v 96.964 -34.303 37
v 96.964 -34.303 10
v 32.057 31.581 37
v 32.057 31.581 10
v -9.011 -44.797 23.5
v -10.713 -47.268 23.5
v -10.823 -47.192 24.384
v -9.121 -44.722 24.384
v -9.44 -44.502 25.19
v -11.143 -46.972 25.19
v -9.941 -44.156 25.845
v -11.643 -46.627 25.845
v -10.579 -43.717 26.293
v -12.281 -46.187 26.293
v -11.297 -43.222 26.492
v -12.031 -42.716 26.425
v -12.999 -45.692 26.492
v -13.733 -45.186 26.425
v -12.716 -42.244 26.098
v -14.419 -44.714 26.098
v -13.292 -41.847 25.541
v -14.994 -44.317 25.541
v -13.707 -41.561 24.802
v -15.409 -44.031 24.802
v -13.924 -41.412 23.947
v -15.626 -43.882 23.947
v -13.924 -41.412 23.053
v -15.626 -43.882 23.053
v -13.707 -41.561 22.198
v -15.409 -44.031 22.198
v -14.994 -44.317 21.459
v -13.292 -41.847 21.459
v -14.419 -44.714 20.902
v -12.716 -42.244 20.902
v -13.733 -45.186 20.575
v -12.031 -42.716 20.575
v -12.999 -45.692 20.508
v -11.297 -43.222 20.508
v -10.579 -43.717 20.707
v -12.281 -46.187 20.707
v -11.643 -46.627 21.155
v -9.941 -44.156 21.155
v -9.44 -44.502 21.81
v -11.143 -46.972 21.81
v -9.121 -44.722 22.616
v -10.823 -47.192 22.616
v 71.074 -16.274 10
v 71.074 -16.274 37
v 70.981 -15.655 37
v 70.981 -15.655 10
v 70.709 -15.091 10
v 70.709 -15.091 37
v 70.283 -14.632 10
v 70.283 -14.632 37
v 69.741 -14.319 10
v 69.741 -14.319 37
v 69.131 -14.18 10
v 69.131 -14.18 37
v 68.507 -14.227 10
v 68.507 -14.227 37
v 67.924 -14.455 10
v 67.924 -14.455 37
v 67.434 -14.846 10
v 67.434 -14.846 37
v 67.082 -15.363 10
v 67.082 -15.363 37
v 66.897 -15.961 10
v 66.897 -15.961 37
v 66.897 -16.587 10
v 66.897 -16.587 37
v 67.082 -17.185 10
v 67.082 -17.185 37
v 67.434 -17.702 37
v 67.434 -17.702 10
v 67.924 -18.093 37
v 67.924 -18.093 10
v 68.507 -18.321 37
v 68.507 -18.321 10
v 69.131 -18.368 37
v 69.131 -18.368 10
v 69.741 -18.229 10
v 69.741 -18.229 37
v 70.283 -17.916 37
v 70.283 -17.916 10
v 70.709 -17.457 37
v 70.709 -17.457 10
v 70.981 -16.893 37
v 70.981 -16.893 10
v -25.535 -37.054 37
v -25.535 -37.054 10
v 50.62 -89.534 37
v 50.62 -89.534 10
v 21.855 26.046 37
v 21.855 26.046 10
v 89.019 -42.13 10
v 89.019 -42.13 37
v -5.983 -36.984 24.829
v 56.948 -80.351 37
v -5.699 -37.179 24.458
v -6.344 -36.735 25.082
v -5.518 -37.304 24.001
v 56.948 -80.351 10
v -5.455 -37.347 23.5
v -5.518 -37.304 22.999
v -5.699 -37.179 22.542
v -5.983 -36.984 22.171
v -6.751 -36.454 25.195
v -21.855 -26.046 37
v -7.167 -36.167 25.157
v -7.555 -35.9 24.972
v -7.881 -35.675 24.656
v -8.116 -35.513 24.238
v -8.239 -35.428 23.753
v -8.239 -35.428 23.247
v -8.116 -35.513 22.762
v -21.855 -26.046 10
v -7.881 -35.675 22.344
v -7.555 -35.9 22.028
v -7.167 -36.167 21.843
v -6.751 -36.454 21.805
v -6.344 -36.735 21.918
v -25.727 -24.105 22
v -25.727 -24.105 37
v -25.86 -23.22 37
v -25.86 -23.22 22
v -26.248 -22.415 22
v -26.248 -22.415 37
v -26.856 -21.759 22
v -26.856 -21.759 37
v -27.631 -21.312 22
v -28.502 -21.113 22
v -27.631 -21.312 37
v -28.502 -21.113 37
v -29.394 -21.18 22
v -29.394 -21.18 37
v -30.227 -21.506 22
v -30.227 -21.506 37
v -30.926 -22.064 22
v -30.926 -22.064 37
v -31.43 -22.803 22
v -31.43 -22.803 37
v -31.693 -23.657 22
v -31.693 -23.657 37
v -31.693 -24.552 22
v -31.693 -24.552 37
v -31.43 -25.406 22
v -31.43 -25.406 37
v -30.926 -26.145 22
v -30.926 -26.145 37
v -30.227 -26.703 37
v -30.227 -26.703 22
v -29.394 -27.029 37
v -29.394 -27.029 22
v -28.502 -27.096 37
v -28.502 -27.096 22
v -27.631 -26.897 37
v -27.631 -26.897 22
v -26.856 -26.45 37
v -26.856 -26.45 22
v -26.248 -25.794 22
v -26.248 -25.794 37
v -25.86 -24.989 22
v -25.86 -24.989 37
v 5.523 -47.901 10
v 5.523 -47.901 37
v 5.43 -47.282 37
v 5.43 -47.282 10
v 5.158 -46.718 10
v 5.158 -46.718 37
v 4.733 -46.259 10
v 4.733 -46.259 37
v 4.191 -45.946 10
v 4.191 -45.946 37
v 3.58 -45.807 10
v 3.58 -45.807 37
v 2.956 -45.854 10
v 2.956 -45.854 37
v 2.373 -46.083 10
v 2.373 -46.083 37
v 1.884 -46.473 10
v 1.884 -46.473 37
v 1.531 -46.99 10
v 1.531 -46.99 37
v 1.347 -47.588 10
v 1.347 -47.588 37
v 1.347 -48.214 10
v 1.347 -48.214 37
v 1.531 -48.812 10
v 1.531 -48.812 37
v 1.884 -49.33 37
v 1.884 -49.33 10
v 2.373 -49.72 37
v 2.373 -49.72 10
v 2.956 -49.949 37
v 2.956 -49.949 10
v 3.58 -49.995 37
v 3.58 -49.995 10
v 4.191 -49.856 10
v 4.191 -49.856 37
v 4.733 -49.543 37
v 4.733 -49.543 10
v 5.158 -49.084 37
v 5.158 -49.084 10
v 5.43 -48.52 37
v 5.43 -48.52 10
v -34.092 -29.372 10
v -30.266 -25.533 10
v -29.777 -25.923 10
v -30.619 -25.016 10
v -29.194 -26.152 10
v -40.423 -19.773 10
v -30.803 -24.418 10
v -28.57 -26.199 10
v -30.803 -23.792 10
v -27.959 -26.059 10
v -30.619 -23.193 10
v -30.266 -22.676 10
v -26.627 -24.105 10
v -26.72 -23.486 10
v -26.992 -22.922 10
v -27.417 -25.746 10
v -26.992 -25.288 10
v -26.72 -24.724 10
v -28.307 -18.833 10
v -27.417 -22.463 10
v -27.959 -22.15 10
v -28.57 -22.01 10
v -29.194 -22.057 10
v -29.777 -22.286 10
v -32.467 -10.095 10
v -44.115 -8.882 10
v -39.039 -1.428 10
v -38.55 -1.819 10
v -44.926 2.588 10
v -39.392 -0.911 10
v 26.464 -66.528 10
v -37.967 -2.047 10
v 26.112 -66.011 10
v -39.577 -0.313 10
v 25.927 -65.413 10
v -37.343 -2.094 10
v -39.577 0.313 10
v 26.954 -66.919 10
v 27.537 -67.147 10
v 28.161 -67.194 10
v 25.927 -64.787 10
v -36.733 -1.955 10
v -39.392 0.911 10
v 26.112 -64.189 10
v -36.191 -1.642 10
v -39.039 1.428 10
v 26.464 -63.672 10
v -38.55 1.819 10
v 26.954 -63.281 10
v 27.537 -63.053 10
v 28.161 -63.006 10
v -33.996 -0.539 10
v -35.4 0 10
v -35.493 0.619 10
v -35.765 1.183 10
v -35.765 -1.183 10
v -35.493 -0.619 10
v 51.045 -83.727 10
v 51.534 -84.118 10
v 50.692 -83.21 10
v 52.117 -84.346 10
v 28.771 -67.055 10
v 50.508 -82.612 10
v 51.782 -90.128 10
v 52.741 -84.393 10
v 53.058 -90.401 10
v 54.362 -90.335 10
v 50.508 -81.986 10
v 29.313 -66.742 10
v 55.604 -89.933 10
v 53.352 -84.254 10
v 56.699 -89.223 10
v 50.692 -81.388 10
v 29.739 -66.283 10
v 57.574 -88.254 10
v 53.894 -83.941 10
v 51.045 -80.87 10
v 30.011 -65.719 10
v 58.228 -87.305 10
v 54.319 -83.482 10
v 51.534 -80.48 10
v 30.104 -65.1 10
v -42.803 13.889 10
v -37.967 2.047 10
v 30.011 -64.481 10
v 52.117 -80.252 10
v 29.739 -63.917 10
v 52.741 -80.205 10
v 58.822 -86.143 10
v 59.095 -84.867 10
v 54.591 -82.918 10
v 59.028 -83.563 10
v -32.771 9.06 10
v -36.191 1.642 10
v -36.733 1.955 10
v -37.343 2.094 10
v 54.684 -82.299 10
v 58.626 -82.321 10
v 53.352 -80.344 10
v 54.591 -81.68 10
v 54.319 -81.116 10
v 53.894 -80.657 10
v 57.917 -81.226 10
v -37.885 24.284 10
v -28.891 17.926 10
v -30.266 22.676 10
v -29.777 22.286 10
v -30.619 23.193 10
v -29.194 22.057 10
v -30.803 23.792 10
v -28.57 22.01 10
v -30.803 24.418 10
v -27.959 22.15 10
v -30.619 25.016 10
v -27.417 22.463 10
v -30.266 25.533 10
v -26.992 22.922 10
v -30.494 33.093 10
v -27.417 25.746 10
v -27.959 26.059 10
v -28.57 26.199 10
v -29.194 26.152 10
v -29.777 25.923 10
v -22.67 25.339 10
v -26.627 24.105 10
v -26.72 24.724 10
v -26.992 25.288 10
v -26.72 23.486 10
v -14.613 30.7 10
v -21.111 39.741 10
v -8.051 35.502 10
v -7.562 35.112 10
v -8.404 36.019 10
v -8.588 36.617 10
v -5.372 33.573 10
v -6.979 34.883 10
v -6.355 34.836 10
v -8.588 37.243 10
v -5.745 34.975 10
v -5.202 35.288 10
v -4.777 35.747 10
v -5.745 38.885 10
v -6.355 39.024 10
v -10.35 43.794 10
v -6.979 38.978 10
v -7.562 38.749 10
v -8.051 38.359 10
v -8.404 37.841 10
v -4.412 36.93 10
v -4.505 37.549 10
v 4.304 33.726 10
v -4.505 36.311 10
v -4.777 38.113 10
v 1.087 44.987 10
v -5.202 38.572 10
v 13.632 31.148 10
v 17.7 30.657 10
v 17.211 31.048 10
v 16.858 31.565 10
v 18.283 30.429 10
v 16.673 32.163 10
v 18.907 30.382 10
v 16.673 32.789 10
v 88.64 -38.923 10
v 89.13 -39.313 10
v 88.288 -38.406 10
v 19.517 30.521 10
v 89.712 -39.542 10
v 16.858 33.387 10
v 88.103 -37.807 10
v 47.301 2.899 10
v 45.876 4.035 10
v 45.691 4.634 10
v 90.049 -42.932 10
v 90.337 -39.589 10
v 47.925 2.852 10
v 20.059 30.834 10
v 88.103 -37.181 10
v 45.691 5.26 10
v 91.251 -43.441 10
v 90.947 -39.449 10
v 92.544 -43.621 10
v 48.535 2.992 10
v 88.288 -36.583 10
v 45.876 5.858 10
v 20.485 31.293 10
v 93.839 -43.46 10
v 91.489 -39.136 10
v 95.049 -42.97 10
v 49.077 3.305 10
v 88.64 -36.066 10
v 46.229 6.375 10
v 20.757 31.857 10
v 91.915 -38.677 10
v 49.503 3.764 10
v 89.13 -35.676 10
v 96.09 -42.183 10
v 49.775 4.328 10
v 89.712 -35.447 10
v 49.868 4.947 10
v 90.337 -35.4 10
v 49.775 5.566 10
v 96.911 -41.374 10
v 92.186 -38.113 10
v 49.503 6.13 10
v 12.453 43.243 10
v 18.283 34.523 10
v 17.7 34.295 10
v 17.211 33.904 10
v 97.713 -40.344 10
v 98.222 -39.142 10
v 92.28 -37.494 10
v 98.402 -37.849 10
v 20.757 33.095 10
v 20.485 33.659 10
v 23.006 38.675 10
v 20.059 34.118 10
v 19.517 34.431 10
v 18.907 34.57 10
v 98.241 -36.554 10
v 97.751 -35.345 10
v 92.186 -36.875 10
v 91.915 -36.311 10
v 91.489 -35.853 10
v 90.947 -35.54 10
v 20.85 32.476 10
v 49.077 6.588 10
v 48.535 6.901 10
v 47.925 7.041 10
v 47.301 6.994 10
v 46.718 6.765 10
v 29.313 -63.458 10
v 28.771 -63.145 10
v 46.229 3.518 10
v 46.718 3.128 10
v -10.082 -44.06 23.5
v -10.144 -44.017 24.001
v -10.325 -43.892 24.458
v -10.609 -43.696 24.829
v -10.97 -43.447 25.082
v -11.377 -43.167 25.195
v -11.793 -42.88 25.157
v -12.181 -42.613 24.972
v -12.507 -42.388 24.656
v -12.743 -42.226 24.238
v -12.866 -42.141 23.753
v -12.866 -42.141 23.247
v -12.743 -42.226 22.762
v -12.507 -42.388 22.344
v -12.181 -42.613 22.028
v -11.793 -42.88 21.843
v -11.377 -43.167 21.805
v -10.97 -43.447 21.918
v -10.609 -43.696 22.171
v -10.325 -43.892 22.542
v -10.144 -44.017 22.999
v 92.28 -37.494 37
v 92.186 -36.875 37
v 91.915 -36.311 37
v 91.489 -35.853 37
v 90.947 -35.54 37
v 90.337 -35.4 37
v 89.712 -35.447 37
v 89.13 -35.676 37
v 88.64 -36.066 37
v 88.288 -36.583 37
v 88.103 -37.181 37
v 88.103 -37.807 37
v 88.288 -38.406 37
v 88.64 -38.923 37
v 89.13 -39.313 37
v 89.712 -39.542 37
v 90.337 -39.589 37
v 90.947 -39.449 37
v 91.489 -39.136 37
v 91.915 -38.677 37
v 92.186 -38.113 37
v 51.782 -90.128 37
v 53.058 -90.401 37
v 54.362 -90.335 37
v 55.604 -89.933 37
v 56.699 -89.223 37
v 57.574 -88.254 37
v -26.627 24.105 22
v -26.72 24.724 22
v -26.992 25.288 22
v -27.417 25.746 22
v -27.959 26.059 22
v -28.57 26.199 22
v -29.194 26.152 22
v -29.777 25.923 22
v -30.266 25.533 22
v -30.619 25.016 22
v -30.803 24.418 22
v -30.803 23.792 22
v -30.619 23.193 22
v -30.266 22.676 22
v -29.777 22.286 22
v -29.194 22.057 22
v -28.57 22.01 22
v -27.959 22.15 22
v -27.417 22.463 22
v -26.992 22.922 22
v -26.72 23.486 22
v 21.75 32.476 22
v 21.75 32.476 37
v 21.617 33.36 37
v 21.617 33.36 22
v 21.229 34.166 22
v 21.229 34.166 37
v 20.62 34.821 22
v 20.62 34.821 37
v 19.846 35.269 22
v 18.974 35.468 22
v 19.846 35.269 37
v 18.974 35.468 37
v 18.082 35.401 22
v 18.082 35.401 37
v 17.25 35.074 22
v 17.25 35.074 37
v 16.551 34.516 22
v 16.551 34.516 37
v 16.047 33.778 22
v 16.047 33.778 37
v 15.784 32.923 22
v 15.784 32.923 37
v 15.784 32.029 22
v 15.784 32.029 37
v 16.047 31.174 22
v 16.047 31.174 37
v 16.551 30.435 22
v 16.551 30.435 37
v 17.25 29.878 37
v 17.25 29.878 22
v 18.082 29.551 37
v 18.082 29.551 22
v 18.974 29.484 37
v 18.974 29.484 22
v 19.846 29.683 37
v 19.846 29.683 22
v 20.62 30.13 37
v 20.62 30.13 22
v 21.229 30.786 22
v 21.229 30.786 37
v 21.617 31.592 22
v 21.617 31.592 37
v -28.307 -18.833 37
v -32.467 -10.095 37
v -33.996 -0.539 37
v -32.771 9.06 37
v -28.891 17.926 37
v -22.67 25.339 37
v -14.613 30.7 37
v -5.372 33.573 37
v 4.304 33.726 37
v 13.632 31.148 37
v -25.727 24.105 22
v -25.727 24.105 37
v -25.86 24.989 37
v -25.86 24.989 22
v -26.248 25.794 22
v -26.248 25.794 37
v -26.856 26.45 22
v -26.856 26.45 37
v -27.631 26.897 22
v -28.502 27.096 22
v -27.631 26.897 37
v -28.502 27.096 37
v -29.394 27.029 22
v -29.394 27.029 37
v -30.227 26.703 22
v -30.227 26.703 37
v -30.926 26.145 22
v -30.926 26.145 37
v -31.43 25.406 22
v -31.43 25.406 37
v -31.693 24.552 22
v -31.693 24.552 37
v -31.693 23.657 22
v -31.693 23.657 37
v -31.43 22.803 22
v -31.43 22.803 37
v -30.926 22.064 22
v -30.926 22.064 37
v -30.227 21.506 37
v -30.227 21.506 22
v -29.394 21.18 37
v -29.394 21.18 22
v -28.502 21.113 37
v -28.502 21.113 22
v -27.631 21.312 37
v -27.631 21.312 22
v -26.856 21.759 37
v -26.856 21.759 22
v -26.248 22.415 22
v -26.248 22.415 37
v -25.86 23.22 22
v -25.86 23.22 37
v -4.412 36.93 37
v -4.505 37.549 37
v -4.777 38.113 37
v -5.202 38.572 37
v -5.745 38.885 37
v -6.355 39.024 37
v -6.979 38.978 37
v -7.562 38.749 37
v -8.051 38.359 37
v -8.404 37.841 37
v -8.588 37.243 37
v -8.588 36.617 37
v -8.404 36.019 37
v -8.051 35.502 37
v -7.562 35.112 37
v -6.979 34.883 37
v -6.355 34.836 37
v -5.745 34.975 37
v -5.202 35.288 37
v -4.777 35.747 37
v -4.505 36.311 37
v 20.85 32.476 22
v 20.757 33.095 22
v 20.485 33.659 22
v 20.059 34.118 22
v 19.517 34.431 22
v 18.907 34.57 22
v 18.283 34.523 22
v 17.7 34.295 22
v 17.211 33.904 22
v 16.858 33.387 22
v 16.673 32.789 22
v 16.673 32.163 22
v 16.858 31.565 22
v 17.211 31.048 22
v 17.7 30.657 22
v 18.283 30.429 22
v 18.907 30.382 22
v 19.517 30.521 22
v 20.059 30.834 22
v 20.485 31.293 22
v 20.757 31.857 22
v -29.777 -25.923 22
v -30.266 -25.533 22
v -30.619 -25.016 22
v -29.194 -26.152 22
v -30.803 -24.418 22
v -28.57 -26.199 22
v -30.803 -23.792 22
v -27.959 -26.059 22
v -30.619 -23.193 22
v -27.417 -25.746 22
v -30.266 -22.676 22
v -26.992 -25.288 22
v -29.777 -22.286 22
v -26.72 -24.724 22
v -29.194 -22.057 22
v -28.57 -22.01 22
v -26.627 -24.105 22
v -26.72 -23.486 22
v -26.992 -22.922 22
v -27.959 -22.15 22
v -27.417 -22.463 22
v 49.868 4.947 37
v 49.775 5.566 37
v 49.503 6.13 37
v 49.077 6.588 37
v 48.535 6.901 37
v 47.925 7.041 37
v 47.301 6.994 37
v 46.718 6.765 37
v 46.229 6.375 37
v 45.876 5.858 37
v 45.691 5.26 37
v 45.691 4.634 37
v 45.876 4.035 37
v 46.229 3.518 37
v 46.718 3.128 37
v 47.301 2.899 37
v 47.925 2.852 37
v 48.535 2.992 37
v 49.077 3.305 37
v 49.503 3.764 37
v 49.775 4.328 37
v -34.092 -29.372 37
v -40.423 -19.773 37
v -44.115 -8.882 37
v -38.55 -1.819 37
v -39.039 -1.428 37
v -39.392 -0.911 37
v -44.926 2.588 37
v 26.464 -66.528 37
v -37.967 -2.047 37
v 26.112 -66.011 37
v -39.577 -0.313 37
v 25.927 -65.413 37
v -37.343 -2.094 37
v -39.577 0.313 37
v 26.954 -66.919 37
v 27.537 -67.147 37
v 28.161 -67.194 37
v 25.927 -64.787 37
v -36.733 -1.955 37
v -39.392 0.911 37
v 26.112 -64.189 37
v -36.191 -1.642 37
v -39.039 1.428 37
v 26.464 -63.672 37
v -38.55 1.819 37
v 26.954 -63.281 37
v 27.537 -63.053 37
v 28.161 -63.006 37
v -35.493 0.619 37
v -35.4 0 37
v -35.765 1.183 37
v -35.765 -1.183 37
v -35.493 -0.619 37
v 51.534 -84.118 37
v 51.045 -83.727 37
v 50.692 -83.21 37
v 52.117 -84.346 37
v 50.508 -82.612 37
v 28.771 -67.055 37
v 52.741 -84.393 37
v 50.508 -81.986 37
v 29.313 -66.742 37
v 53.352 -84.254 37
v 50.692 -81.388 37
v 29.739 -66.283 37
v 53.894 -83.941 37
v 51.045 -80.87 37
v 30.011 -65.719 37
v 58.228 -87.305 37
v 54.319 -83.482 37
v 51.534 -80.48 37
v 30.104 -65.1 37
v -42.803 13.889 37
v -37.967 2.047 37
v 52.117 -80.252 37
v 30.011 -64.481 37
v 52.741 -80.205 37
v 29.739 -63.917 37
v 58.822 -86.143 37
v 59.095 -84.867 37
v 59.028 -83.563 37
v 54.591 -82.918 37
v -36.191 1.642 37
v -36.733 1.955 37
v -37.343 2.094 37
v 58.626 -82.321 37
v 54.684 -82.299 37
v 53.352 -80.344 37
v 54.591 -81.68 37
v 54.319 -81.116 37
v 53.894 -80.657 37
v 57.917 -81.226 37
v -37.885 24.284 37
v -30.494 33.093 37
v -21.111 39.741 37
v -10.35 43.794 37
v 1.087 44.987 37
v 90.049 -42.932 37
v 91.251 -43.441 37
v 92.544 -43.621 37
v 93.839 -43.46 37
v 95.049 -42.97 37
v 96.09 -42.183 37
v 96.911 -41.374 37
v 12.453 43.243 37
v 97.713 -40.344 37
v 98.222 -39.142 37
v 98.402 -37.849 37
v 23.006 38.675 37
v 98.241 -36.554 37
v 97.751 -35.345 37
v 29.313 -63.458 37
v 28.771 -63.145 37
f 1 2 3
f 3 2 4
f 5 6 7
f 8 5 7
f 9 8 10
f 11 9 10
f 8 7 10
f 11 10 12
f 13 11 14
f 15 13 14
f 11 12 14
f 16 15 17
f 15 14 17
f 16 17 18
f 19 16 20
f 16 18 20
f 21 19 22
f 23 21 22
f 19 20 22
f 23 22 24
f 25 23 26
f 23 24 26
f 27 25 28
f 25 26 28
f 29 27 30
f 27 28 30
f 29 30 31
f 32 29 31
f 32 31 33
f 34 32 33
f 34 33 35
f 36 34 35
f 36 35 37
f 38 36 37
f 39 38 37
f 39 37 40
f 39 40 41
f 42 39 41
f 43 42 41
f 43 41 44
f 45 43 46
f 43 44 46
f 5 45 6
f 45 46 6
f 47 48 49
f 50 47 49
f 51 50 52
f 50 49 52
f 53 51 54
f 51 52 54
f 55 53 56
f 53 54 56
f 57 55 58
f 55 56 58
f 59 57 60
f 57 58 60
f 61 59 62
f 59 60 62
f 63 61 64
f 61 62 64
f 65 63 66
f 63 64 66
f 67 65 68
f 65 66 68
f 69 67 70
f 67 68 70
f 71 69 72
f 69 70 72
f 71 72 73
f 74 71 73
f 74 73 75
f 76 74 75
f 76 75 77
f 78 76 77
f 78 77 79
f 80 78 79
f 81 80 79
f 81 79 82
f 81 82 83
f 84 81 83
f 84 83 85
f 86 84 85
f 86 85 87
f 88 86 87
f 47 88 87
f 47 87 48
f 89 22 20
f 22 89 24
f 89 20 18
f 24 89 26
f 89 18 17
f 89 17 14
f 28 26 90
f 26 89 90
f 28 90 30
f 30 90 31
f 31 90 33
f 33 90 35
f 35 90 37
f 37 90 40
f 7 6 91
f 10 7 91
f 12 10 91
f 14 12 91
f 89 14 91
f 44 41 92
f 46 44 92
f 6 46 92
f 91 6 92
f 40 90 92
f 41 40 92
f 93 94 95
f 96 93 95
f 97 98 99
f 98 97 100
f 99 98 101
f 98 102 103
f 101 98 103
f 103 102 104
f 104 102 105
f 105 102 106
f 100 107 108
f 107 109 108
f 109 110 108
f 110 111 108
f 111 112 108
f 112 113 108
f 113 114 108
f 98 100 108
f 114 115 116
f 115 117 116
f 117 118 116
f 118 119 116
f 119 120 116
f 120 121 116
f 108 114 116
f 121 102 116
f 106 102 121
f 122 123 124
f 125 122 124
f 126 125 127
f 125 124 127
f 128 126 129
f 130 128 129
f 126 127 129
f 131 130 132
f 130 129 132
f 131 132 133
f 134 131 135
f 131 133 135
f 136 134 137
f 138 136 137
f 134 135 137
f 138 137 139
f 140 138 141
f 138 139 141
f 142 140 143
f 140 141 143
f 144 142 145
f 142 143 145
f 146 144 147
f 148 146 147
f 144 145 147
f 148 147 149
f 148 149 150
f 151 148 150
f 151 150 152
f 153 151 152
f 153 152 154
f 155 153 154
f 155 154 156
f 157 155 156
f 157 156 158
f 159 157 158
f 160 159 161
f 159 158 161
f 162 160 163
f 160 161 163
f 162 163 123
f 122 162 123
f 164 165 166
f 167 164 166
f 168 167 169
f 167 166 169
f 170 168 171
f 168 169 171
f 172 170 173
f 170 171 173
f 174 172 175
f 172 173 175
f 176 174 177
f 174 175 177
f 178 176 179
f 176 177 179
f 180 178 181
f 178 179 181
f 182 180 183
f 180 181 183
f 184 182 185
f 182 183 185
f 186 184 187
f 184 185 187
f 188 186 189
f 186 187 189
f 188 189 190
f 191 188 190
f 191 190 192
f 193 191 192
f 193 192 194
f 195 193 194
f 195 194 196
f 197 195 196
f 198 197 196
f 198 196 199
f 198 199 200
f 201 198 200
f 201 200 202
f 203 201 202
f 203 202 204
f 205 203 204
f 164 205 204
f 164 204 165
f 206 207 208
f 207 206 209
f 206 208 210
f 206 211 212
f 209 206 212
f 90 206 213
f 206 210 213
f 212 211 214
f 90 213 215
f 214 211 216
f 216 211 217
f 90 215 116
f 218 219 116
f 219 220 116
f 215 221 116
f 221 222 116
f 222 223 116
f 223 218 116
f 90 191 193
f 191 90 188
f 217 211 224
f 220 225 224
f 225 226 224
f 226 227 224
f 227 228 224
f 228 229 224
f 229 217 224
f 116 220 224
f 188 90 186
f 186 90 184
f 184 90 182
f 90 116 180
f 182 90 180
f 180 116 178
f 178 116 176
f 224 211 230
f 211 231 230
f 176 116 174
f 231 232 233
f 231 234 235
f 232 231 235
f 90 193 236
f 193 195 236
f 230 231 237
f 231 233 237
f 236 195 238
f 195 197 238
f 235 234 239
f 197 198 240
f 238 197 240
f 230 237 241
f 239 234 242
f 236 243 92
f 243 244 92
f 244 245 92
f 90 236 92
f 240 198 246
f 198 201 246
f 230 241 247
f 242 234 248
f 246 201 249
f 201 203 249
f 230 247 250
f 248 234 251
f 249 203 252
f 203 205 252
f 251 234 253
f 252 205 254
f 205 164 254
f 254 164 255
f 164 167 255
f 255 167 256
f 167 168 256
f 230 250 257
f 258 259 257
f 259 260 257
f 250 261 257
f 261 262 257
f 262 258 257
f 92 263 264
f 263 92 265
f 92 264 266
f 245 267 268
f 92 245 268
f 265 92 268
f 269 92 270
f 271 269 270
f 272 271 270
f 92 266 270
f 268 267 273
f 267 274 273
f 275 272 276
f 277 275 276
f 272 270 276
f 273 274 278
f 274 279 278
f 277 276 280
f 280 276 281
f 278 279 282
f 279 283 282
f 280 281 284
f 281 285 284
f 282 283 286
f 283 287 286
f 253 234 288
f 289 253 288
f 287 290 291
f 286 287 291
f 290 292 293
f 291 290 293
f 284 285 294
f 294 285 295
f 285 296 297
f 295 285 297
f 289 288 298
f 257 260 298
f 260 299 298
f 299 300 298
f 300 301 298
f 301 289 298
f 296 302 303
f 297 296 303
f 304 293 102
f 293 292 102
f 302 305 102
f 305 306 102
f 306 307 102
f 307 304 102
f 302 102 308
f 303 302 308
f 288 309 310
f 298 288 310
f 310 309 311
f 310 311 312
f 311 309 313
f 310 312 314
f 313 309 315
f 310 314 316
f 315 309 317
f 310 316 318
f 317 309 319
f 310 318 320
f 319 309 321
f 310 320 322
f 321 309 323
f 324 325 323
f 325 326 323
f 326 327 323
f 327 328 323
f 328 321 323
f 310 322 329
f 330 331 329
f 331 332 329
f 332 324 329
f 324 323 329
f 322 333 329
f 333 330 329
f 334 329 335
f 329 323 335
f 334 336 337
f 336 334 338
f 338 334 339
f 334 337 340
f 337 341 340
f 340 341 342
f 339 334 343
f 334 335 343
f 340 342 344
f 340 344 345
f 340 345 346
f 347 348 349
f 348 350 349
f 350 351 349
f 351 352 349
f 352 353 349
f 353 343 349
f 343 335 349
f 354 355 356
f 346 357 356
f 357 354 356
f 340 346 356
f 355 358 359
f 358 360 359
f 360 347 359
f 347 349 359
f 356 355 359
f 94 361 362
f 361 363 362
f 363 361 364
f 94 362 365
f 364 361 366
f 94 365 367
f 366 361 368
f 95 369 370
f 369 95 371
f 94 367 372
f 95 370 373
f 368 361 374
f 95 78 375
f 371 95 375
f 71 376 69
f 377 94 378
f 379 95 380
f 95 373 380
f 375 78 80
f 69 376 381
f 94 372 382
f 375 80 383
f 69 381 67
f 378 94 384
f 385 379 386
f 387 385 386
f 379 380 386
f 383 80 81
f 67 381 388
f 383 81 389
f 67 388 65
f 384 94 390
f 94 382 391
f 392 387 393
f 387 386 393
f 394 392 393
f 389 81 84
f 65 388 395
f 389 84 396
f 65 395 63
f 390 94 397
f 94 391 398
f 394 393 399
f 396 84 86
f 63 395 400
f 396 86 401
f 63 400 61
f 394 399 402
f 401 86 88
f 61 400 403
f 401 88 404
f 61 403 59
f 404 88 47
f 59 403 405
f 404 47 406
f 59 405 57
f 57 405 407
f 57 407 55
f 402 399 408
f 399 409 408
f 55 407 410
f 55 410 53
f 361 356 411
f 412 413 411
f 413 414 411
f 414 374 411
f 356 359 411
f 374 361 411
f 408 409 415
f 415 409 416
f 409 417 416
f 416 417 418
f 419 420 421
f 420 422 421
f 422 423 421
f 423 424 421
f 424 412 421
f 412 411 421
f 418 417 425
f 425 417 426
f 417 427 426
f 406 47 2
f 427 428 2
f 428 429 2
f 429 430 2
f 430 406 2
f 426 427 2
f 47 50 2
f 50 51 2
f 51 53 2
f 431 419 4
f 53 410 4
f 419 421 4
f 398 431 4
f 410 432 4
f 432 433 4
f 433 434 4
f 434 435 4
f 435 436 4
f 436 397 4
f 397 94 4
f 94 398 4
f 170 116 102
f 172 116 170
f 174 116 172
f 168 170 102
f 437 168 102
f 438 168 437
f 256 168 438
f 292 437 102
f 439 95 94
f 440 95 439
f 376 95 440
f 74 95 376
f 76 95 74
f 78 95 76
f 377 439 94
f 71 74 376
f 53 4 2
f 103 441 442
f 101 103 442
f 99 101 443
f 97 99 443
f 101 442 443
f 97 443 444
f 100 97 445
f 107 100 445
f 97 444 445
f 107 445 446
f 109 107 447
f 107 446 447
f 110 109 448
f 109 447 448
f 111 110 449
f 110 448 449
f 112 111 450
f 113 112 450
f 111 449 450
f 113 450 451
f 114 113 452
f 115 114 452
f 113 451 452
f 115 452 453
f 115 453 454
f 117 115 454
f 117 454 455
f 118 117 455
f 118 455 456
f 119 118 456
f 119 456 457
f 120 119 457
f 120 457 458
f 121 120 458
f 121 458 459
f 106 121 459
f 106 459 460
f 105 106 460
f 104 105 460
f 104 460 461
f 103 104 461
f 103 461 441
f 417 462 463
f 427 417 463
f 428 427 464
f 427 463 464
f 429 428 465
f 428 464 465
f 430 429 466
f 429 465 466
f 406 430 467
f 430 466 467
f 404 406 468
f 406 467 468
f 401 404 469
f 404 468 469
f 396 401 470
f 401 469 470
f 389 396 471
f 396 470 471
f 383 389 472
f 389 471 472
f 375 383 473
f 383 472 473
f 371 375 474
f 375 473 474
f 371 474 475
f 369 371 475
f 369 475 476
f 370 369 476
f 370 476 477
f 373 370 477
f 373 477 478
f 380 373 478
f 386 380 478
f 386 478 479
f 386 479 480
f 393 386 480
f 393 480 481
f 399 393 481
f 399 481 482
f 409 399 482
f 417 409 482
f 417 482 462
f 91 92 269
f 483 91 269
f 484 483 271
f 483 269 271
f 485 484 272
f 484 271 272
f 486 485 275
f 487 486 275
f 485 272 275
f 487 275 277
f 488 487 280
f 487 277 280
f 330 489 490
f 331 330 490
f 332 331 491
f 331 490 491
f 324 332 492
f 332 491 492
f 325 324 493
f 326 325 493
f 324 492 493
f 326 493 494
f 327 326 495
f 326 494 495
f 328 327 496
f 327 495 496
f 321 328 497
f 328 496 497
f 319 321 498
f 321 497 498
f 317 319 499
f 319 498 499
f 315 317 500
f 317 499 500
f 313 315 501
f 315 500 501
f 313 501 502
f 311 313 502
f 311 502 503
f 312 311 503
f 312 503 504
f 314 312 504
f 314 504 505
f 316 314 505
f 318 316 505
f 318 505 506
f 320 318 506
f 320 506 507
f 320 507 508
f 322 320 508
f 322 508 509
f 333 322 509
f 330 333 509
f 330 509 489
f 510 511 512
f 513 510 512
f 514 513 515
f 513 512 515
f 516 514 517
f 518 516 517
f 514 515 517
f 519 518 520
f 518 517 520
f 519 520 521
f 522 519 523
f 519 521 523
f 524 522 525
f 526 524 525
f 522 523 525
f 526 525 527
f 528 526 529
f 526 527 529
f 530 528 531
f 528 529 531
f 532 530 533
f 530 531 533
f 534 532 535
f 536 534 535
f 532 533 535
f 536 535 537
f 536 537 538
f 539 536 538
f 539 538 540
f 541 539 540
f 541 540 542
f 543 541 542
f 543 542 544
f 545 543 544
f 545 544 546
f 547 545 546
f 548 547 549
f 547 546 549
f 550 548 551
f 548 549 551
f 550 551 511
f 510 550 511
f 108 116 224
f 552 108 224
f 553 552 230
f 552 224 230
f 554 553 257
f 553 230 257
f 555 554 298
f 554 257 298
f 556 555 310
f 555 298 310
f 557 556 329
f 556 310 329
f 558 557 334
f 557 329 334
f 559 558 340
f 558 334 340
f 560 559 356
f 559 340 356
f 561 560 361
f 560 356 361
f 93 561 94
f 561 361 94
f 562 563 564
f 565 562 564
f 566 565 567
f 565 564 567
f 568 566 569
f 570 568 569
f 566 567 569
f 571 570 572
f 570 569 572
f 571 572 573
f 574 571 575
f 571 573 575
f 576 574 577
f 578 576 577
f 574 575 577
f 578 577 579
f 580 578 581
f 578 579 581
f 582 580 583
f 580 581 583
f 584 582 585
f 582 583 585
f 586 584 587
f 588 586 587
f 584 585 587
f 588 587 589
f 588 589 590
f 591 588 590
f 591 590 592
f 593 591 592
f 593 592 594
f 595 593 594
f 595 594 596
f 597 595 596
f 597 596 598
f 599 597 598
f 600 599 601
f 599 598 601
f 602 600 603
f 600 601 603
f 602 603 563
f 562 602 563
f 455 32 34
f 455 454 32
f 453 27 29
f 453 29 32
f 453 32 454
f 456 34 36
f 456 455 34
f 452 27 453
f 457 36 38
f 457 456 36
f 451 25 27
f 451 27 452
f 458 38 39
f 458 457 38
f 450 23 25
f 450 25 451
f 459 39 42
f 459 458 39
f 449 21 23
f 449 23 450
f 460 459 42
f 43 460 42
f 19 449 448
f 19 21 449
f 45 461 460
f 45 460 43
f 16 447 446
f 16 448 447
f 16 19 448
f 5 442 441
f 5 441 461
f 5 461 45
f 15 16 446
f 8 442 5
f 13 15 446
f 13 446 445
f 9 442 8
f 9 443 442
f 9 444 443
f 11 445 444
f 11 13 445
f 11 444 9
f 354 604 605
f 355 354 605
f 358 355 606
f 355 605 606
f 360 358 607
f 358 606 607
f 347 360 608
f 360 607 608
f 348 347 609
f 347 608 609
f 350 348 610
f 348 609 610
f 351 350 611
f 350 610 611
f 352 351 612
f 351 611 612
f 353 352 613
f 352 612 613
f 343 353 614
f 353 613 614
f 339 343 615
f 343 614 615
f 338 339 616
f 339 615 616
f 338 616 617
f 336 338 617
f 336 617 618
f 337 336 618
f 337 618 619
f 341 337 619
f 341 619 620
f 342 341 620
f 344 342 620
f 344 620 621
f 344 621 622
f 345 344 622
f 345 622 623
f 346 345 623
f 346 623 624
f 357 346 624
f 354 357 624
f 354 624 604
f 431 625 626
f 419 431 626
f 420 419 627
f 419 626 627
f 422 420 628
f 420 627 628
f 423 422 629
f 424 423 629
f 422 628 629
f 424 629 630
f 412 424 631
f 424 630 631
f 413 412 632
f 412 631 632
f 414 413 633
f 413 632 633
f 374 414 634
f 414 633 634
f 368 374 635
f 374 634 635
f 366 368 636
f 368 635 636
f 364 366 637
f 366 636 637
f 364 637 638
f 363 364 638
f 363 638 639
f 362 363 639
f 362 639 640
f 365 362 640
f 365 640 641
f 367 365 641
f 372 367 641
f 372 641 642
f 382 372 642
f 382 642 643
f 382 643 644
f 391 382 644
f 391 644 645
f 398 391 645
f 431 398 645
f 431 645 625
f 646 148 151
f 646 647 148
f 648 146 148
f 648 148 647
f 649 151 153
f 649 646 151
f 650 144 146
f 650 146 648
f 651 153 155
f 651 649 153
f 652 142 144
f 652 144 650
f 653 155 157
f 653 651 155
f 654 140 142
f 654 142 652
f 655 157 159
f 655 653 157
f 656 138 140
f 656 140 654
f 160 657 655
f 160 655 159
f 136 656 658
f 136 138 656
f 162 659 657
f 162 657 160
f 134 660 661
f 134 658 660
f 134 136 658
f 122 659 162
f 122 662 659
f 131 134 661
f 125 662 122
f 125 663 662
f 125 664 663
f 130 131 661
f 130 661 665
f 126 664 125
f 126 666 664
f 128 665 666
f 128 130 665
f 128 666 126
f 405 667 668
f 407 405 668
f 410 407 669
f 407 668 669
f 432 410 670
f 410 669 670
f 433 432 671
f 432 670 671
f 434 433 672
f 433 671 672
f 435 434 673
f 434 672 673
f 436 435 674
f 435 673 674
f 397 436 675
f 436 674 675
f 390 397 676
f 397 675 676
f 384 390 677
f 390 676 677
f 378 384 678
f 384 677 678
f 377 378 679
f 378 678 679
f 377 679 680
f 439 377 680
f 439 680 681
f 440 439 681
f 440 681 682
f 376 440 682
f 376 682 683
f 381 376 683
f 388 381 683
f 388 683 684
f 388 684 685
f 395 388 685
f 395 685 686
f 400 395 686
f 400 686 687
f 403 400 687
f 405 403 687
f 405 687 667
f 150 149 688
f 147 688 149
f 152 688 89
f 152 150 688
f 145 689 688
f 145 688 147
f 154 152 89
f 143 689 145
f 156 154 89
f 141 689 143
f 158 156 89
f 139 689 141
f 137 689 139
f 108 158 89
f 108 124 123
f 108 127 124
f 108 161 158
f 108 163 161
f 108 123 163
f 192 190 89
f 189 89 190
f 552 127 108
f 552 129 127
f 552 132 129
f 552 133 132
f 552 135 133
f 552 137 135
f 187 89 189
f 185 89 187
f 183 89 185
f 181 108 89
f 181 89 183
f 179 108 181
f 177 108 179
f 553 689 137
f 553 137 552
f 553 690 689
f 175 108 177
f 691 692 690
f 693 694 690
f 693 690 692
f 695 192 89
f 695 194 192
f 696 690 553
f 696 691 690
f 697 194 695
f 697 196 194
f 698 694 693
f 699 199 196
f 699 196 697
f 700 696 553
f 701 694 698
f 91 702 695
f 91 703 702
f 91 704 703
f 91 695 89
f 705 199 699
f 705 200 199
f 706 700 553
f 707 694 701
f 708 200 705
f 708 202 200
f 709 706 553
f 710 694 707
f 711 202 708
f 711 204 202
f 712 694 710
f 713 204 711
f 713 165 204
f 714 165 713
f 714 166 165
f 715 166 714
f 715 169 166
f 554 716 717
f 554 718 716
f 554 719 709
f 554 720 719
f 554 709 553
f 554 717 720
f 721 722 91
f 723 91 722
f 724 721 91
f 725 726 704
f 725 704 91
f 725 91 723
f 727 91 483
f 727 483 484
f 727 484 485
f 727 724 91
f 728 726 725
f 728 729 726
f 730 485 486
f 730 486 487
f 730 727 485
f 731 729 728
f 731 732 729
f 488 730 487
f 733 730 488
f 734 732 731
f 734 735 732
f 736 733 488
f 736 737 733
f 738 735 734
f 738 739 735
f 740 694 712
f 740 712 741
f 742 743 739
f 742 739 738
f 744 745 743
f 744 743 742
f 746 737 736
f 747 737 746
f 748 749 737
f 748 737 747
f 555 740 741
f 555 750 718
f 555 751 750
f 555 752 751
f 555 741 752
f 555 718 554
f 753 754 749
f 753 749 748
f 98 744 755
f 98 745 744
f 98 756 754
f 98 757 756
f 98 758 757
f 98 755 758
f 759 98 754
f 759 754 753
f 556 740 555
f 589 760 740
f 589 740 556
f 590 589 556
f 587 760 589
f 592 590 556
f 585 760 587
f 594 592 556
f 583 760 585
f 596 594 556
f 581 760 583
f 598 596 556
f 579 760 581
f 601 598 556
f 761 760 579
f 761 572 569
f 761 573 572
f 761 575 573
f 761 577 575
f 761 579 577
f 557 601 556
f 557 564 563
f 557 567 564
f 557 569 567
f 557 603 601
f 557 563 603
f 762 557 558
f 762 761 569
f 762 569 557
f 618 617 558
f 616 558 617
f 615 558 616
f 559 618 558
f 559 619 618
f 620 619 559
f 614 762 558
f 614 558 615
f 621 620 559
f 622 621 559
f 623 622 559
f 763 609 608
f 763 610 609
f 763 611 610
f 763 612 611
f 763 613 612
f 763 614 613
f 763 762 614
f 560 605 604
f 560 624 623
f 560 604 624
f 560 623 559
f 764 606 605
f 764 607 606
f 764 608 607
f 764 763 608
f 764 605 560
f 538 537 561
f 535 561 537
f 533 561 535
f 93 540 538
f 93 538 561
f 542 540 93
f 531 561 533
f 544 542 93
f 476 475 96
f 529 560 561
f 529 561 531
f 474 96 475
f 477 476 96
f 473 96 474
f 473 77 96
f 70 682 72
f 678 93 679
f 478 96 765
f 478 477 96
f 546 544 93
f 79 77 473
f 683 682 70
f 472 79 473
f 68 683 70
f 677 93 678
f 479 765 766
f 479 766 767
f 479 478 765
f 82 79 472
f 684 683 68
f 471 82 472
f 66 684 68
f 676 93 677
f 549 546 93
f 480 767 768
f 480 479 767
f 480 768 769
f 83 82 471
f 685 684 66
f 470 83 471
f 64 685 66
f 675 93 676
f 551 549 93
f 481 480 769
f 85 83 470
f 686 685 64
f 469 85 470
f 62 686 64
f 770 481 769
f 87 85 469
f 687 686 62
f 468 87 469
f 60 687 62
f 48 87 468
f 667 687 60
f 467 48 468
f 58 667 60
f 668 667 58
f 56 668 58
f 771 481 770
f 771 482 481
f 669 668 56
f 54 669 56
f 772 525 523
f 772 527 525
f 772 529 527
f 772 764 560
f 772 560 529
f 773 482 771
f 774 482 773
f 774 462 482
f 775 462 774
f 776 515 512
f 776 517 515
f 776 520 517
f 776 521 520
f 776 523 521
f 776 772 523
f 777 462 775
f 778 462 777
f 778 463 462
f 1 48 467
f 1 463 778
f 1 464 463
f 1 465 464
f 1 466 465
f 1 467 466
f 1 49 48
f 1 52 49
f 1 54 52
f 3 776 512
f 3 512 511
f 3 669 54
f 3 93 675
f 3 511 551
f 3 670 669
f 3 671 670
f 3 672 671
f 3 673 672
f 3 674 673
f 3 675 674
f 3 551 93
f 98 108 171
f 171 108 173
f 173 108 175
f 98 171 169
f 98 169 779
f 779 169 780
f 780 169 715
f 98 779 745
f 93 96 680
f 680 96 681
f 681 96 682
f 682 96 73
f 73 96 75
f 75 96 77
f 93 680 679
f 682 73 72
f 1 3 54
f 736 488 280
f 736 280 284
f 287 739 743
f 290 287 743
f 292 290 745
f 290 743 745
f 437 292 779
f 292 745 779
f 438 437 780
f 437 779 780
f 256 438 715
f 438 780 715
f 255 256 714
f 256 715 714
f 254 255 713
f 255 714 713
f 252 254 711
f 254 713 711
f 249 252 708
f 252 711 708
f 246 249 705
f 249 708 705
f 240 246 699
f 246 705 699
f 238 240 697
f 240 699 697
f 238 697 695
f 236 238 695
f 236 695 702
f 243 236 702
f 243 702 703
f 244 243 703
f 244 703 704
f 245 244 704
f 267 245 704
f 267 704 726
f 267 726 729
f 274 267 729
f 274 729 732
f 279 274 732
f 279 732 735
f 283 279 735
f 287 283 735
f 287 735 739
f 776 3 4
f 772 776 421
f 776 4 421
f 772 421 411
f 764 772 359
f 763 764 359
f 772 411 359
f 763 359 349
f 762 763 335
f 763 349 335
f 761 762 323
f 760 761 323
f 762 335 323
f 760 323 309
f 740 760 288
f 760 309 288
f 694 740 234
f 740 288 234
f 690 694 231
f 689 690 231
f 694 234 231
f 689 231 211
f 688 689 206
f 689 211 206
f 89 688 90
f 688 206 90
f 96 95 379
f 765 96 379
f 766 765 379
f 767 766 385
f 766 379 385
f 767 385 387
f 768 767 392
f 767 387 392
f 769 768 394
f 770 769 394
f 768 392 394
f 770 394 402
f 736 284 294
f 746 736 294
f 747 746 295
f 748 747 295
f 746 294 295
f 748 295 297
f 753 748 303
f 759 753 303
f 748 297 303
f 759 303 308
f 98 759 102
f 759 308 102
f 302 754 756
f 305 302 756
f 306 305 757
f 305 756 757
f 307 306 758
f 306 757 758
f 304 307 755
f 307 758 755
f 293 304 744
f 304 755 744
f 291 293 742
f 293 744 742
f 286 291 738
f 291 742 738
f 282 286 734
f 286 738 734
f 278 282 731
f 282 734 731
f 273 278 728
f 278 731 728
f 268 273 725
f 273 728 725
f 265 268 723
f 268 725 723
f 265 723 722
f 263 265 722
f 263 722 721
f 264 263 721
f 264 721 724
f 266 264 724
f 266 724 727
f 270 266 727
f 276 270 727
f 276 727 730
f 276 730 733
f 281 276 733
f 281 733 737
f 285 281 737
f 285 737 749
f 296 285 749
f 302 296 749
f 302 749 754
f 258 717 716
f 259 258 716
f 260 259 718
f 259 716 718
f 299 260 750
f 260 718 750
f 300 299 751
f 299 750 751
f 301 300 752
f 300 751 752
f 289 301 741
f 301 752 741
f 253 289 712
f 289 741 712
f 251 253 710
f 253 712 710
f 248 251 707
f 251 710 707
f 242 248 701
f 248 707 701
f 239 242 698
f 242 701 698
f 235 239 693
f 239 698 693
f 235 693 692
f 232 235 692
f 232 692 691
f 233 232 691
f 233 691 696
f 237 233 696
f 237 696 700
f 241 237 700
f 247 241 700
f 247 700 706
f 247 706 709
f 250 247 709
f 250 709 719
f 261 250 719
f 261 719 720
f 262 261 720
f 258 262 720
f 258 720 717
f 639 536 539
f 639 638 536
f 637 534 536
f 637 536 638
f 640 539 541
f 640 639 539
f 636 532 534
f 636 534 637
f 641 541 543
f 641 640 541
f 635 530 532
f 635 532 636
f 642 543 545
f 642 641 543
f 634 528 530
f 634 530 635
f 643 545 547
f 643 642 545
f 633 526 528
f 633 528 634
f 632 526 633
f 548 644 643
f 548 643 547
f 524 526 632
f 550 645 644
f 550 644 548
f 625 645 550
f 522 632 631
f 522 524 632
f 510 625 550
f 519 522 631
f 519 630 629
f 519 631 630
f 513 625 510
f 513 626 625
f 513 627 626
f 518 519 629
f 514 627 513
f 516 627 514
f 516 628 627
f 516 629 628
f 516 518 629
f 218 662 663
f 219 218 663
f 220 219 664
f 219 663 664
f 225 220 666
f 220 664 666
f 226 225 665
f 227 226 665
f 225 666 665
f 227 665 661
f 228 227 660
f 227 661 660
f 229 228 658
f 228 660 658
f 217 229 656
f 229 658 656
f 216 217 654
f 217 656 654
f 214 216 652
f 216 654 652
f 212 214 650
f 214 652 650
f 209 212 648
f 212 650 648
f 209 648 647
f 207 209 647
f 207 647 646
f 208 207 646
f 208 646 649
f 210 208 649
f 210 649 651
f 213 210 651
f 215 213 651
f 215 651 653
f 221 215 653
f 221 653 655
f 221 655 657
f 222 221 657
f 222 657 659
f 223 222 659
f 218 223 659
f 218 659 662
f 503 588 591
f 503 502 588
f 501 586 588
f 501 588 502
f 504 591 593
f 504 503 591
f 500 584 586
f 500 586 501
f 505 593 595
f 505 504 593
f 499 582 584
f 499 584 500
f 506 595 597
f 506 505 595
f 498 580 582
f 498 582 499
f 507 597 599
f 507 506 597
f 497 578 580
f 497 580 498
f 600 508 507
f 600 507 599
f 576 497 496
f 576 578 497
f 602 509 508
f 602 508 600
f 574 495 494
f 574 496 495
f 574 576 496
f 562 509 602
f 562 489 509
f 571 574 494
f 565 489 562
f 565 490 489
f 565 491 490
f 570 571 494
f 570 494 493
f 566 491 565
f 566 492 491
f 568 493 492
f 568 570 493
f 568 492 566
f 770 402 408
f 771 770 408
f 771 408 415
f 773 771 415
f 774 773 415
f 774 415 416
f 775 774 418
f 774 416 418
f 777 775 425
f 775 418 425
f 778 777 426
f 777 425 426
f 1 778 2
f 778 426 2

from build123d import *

# Parameters (mm, degrees)
SKETCH1_R           = 1.6
BOSS_EXTRUDE1_DEPTH = 27
CUT_EXTRUDE1_REACH  = 138.335
SKETCH2_R           = 2.1
CUT_EXTRUDE2_REACH  = 155.174
SKETCH3_R           = 1.7
SKETCH3_3_R         = 3
SKETCH3_3_R_2       = 1.7
CUT_EXTRUDE3_DEPTH  = 3
SKETCH4_R           = 3
CUT_EXTRUDE4_DEPTH  = 15


with BuildPart() as part:
    # Sketch1 → Boss-Extrude1 (new body)
    with BuildSketch(Plane.XY.offset(10)):
        with BuildLine():
            Line((-25.534872354, -37.053613776), (50.619597549, -89.534180987))
            ThreePointArc((50.619597549, -89.534180987), (54.361803385, -90.334528675), (57.573873786, -88.254320829))
            Line((57.573873786, -88.254320829), (58.227827632, -87.305369414))
            ThreePointArc((58.227827632, -87.305369414), (59.02817532, -83.563163578), (56.947967474, -80.351093178))
            Line((56.947967474, -80.351093178), (-21.854778729, -26.045511066))
            ThreePointArc((-21.854778729, -26.045511066), (-26.045511066, 21.854778729), (21.854778729, 26.045511066))
            Line((21.854778729, 26.045511066), (89.019290298, -42.129978983))
            ThreePointArc((89.019290298, -42.129978983), (92.543786433, -43.620813626), (96.090160837, -42.182797794))
            Line((96.090160837, -42.182797794), (96.911137653, -41.373995292))
            ThreePointArc((96.911137653, -41.373995292), (98.401972296, -37.849499157), (96.963956464, -34.303124754))
            Line((96.963956464, -34.303124754), (32.056602073, 31.581232775))
            ThreePointArc((32.056602073, 31.581232775), (-34.47199994, 28.925442436), (-25.534872354, -37.053613776))
        make_face()
        with Locations((90.17973297, -37.494440018)):
            Circle(SKETCH1_R, mode=Mode.SUBTRACT)
        with Locations((68.973861607, -16.273907044)):
            Circle(SKETCH1_R, mode=Mode.SUBTRACT)
        with Locations((47.767990244, 4.946625931)):
            Circle(SKETCH1_R, mode=Mode.SUBTRACT)
        with Locations((18.75, 32.475952642)):
            Circle(SKETCH1_R, mode=Mode.SUBTRACT)
        with Locations((-6.511806663, 36.930290738)):
            Circle(SKETCH1_R, mode=Mode.SUBTRACT)
        with Locations((-28.726666617, 24.104535363)):
            Circle(SKETCH1_R, mode=Mode.SUBTRACT)
        with Locations((-37.5, 0)):
            Circle(SKETCH1_R, mode=Mode.SUBTRACT)
        with Locations((-28.726666617, -24.104535363)):
            Circle(SKETCH1_R, mode=Mode.SUBTRACT)
        with Locations((3.423348889, -47.901259716)):
            Circle(SKETCH1_R, mode=Mode.SUBTRACT)
        with Locations((28.003855203, -65.100059364)):
            Circle(SKETCH1_R, mode=Mode.SUBTRACT)
        with Locations((52.584361518, -82.298859012)):
            Circle(SKETCH1_R, mode=Mode.SUBTRACT)
    extrude(amount=BOSS_EXTRUDE1_DEPTH)

    # Sketch2 → Cut-Extrude1 (cut, up to next)
    with BuildSketch(Plane.XY.offset(37), mode=Mode.PRIVATE) as cut_extrude1_sk1:
        with Locations((52.584361518, -82.298859012)):
            Circle(SKETCH2_R)
    cut_extrude1_tool1 = extrude(cut_extrude1_sk1.sketch, amount=-CUT_EXTRUDE1_REACH, mode=Mode.PRIVATE) & part.part
    # Sketch2 → Cut-Extrude1 (cut, up to next)
    with BuildSketch(Plane.XY.offset(37), mode=Mode.PRIVATE) as cut_extrude1_sk2:
        with Locations((28.003855203, -65.100059364)):
            Circle(SKETCH2_R)
    cut_extrude1_tool2 = extrude(cut_extrude1_sk2.sketch, amount=-CUT_EXTRUDE1_REACH, mode=Mode.PRIVATE) & part.part
    # Sketch2 → Cut-Extrude1 (cut, up to next)
    with BuildSketch(Plane.XY.offset(37), mode=Mode.PRIVATE) as cut_extrude1_sk3:
        with Locations((3.423348889, -47.901259716)):
            Circle(SKETCH2_R)
    cut_extrude1_tool3 = extrude(cut_extrude1_sk3.sketch, amount=-CUT_EXTRUDE1_REACH, mode=Mode.PRIVATE) & part.part
    # Sketch2 → Cut-Extrude1 (cut, up to next)
    with BuildSketch(Plane.XY.offset(37), mode=Mode.PRIVATE) as cut_extrude1_sk4:
        with Locations((-28.726666617, -24.104535363)):
            Circle(SKETCH2_R)
    cut_extrude1_tool4 = extrude(cut_extrude1_sk4.sketch, amount=-CUT_EXTRUDE1_REACH, mode=Mode.PRIVATE) & part.part
    # Sketch2 → Cut-Extrude1 (cut, up to next)
    with BuildSketch(Plane.XY.offset(37), mode=Mode.PRIVATE) as cut_extrude1_sk5:
        with Locations((-37.5, 0)):
            Circle(SKETCH2_R)
    cut_extrude1_tool5 = extrude(cut_extrude1_sk5.sketch, amount=-CUT_EXTRUDE1_REACH, mode=Mode.PRIVATE) & part.part
    # Sketch2 → Cut-Extrude1 (cut, up to next)
    with BuildSketch(Plane.XY.offset(37), mode=Mode.PRIVATE) as cut_extrude1_sk6:
        with Locations((-28.726666617, 24.104535363)):
            Circle(SKETCH2_R)
    cut_extrude1_tool6 = extrude(cut_extrude1_sk6.sketch, amount=-CUT_EXTRUDE1_REACH, mode=Mode.PRIVATE) & part.part
    # Sketch2 → Cut-Extrude1 (cut, up to next)
    with BuildSketch(Plane.XY.offset(37), mode=Mode.PRIVATE) as cut_extrude1_sk7:
        with Locations((-6.511806663, 36.930290738)):
            Circle(SKETCH2_R)
    cut_extrude1_tool7 = extrude(cut_extrude1_sk7.sketch, amount=-CUT_EXTRUDE1_REACH, mode=Mode.PRIVATE) & part.part
    # Sketch2 → Cut-Extrude1 (cut, up to next)
    with BuildSketch(Plane.XY.offset(37), mode=Mode.PRIVATE) as cut_extrude1_sk8:
        with Locations((18.75, 32.475952642)):
            Circle(SKETCH2_R)
    cut_extrude1_tool8 = extrude(cut_extrude1_sk8.sketch, amount=-CUT_EXTRUDE1_REACH, mode=Mode.PRIVATE) & part.part
    # Sketch2 → Cut-Extrude1 (cut, up to next)
    with BuildSketch(Plane.XY.offset(37), mode=Mode.PRIVATE) as cut_extrude1_sk9:
        with Locations((47.767990244, 4.946625931)):
            Circle(SKETCH2_R)
    cut_extrude1_tool9 = extrude(cut_extrude1_sk9.sketch, amount=-CUT_EXTRUDE1_REACH, mode=Mode.PRIVATE) & part.part
    # Sketch2 → Cut-Extrude1 (cut, up to next)
    with BuildSketch(Plane.XY.offset(37), mode=Mode.PRIVATE) as cut_extrude1_sk10:
        with Locations((68.973861607, -16.273907044)):
            Circle(SKETCH2_R)
    cut_extrude1_tool10 = extrude(cut_extrude1_sk10.sketch, amount=-CUT_EXTRUDE1_REACH, mode=Mode.PRIVATE) & part.part
    # Sketch2 → Cut-Extrude1 (cut, up to next)
    with BuildSketch(Plane.XY.offset(37), mode=Mode.PRIVATE) as cut_extrude1_sk11:
        with Locations((90.17973297, -37.494440018)):
            Circle(SKETCH2_R)
    cut_extrude1_tool11 = extrude(cut_extrude1_sk11.sketch, amount=-CUT_EXTRUDE1_REACH, mode=Mode.PRIVATE) & part.part
    add(cut_extrude1_tool1.solids().sort_by_distance((52.584362, -82.298859, 37))[0], mode=Mode.SUBTRACT)
    add(cut_extrude1_tool2.solids().sort_by_distance((28.003855, -65.100059, 37))[0], mode=Mode.SUBTRACT)
    add(cut_extrude1_tool3.solids().sort_by_distance((3.423349, -47.90126, 37))[0], mode=Mode.SUBTRACT)
    add(cut_extrude1_tool4.solids().sort_by_distance((-28.726667, -24.104535, 37))[0], mode=Mode.SUBTRACT)
    add(cut_extrude1_tool5.solids().sort_by_distance((-37.5, 0, 37))[0], mode=Mode.SUBTRACT)
    add(cut_extrude1_tool6.solids().sort_by_distance((-28.726667, 24.104535, 37))[0], mode=Mode.SUBTRACT)
    add(cut_extrude1_tool7.solids().sort_by_distance((-6.511807, 36.930291, 37))[0], mode=Mode.SUBTRACT)
    add(cut_extrude1_tool8.solids().sort_by_distance((18.75, 32.475953, 37))[0], mode=Mode.SUBTRACT)
    add(cut_extrude1_tool9.solids().sort_by_distance((47.76799, 4.946626, 37))[0], mode=Mode.SUBTRACT)
    add(cut_extrude1_tool10.solids().sort_by_distance((68.973862, -16.273907, 37))[0], mode=Mode.SUBTRACT)
    add(cut_extrude1_tool11.solids().sort_by_distance((90.179733, -37.49444, 37))[0], mode=Mode.SUBTRACT)

    # Sketch3 → Cut-Extrude2 (cut, up to next)
    with BuildSketch(Plane(origin=(-25.534872354, -37.053613776, 0), x_dir=(0.823413639467006, -0.567441607867893, 0), z_dir=(-0.5674416078678929, -0.8234136394670059, 0)), mode=Mode.PRIVATE) as cut_extrude2_sk1:
        with Locations((15, 23.5)):
            Circle(SKETCH3_R)
    cut_extrude2_tool1 = extrude(cut_extrude2_sk1.sketch, amount=-CUT_EXTRUDE2_REACH, mode=Mode.PRIVATE) & part.part
    add(cut_extrude2_tool1.solids().sort_by_distance((-13.183668, -45.565238, 23.5))[0], mode=Mode.SUBTRACT)

    # Sketch3<3> → Cut-Extrude3 (cut)
    with BuildSketch(Plane(origin=(-25.534872354, -37.053613776, 0), x_dir=(0.823413639467006, -0.567441607867893, 0), z_dir=(-0.5674416078678929, -0.8234136394670059, 0))):
        with Locations((15, 23.5)):
            Circle(SKETCH3_3_R)
        with Locations((15, 23.5)):
            Circle(SKETCH3_3_R_2, mode=Mode.SUBTRACT)
    extrude(amount=-CUT_EXTRUDE3_DEPTH, mode=Mode.SUBTRACT)

    # Sketch4 → Cut-Extrude4 (cut)
    with BuildSketch(Plane.XY.offset(37)):
        with Locations((18.75, 32.475952642)):
            Circle(SKETCH4_R)
        with Locations((-28.726666617, 24.104535363)):
            Circle(SKETCH4_R)
        with Locations((-28.726666617, -24.104535363)):
            Circle(SKETCH4_R)
    extrude(amount=-CUT_EXTRUDE4_DEPTH, mode=Mode.SUBTRACT)


solid = part.part
